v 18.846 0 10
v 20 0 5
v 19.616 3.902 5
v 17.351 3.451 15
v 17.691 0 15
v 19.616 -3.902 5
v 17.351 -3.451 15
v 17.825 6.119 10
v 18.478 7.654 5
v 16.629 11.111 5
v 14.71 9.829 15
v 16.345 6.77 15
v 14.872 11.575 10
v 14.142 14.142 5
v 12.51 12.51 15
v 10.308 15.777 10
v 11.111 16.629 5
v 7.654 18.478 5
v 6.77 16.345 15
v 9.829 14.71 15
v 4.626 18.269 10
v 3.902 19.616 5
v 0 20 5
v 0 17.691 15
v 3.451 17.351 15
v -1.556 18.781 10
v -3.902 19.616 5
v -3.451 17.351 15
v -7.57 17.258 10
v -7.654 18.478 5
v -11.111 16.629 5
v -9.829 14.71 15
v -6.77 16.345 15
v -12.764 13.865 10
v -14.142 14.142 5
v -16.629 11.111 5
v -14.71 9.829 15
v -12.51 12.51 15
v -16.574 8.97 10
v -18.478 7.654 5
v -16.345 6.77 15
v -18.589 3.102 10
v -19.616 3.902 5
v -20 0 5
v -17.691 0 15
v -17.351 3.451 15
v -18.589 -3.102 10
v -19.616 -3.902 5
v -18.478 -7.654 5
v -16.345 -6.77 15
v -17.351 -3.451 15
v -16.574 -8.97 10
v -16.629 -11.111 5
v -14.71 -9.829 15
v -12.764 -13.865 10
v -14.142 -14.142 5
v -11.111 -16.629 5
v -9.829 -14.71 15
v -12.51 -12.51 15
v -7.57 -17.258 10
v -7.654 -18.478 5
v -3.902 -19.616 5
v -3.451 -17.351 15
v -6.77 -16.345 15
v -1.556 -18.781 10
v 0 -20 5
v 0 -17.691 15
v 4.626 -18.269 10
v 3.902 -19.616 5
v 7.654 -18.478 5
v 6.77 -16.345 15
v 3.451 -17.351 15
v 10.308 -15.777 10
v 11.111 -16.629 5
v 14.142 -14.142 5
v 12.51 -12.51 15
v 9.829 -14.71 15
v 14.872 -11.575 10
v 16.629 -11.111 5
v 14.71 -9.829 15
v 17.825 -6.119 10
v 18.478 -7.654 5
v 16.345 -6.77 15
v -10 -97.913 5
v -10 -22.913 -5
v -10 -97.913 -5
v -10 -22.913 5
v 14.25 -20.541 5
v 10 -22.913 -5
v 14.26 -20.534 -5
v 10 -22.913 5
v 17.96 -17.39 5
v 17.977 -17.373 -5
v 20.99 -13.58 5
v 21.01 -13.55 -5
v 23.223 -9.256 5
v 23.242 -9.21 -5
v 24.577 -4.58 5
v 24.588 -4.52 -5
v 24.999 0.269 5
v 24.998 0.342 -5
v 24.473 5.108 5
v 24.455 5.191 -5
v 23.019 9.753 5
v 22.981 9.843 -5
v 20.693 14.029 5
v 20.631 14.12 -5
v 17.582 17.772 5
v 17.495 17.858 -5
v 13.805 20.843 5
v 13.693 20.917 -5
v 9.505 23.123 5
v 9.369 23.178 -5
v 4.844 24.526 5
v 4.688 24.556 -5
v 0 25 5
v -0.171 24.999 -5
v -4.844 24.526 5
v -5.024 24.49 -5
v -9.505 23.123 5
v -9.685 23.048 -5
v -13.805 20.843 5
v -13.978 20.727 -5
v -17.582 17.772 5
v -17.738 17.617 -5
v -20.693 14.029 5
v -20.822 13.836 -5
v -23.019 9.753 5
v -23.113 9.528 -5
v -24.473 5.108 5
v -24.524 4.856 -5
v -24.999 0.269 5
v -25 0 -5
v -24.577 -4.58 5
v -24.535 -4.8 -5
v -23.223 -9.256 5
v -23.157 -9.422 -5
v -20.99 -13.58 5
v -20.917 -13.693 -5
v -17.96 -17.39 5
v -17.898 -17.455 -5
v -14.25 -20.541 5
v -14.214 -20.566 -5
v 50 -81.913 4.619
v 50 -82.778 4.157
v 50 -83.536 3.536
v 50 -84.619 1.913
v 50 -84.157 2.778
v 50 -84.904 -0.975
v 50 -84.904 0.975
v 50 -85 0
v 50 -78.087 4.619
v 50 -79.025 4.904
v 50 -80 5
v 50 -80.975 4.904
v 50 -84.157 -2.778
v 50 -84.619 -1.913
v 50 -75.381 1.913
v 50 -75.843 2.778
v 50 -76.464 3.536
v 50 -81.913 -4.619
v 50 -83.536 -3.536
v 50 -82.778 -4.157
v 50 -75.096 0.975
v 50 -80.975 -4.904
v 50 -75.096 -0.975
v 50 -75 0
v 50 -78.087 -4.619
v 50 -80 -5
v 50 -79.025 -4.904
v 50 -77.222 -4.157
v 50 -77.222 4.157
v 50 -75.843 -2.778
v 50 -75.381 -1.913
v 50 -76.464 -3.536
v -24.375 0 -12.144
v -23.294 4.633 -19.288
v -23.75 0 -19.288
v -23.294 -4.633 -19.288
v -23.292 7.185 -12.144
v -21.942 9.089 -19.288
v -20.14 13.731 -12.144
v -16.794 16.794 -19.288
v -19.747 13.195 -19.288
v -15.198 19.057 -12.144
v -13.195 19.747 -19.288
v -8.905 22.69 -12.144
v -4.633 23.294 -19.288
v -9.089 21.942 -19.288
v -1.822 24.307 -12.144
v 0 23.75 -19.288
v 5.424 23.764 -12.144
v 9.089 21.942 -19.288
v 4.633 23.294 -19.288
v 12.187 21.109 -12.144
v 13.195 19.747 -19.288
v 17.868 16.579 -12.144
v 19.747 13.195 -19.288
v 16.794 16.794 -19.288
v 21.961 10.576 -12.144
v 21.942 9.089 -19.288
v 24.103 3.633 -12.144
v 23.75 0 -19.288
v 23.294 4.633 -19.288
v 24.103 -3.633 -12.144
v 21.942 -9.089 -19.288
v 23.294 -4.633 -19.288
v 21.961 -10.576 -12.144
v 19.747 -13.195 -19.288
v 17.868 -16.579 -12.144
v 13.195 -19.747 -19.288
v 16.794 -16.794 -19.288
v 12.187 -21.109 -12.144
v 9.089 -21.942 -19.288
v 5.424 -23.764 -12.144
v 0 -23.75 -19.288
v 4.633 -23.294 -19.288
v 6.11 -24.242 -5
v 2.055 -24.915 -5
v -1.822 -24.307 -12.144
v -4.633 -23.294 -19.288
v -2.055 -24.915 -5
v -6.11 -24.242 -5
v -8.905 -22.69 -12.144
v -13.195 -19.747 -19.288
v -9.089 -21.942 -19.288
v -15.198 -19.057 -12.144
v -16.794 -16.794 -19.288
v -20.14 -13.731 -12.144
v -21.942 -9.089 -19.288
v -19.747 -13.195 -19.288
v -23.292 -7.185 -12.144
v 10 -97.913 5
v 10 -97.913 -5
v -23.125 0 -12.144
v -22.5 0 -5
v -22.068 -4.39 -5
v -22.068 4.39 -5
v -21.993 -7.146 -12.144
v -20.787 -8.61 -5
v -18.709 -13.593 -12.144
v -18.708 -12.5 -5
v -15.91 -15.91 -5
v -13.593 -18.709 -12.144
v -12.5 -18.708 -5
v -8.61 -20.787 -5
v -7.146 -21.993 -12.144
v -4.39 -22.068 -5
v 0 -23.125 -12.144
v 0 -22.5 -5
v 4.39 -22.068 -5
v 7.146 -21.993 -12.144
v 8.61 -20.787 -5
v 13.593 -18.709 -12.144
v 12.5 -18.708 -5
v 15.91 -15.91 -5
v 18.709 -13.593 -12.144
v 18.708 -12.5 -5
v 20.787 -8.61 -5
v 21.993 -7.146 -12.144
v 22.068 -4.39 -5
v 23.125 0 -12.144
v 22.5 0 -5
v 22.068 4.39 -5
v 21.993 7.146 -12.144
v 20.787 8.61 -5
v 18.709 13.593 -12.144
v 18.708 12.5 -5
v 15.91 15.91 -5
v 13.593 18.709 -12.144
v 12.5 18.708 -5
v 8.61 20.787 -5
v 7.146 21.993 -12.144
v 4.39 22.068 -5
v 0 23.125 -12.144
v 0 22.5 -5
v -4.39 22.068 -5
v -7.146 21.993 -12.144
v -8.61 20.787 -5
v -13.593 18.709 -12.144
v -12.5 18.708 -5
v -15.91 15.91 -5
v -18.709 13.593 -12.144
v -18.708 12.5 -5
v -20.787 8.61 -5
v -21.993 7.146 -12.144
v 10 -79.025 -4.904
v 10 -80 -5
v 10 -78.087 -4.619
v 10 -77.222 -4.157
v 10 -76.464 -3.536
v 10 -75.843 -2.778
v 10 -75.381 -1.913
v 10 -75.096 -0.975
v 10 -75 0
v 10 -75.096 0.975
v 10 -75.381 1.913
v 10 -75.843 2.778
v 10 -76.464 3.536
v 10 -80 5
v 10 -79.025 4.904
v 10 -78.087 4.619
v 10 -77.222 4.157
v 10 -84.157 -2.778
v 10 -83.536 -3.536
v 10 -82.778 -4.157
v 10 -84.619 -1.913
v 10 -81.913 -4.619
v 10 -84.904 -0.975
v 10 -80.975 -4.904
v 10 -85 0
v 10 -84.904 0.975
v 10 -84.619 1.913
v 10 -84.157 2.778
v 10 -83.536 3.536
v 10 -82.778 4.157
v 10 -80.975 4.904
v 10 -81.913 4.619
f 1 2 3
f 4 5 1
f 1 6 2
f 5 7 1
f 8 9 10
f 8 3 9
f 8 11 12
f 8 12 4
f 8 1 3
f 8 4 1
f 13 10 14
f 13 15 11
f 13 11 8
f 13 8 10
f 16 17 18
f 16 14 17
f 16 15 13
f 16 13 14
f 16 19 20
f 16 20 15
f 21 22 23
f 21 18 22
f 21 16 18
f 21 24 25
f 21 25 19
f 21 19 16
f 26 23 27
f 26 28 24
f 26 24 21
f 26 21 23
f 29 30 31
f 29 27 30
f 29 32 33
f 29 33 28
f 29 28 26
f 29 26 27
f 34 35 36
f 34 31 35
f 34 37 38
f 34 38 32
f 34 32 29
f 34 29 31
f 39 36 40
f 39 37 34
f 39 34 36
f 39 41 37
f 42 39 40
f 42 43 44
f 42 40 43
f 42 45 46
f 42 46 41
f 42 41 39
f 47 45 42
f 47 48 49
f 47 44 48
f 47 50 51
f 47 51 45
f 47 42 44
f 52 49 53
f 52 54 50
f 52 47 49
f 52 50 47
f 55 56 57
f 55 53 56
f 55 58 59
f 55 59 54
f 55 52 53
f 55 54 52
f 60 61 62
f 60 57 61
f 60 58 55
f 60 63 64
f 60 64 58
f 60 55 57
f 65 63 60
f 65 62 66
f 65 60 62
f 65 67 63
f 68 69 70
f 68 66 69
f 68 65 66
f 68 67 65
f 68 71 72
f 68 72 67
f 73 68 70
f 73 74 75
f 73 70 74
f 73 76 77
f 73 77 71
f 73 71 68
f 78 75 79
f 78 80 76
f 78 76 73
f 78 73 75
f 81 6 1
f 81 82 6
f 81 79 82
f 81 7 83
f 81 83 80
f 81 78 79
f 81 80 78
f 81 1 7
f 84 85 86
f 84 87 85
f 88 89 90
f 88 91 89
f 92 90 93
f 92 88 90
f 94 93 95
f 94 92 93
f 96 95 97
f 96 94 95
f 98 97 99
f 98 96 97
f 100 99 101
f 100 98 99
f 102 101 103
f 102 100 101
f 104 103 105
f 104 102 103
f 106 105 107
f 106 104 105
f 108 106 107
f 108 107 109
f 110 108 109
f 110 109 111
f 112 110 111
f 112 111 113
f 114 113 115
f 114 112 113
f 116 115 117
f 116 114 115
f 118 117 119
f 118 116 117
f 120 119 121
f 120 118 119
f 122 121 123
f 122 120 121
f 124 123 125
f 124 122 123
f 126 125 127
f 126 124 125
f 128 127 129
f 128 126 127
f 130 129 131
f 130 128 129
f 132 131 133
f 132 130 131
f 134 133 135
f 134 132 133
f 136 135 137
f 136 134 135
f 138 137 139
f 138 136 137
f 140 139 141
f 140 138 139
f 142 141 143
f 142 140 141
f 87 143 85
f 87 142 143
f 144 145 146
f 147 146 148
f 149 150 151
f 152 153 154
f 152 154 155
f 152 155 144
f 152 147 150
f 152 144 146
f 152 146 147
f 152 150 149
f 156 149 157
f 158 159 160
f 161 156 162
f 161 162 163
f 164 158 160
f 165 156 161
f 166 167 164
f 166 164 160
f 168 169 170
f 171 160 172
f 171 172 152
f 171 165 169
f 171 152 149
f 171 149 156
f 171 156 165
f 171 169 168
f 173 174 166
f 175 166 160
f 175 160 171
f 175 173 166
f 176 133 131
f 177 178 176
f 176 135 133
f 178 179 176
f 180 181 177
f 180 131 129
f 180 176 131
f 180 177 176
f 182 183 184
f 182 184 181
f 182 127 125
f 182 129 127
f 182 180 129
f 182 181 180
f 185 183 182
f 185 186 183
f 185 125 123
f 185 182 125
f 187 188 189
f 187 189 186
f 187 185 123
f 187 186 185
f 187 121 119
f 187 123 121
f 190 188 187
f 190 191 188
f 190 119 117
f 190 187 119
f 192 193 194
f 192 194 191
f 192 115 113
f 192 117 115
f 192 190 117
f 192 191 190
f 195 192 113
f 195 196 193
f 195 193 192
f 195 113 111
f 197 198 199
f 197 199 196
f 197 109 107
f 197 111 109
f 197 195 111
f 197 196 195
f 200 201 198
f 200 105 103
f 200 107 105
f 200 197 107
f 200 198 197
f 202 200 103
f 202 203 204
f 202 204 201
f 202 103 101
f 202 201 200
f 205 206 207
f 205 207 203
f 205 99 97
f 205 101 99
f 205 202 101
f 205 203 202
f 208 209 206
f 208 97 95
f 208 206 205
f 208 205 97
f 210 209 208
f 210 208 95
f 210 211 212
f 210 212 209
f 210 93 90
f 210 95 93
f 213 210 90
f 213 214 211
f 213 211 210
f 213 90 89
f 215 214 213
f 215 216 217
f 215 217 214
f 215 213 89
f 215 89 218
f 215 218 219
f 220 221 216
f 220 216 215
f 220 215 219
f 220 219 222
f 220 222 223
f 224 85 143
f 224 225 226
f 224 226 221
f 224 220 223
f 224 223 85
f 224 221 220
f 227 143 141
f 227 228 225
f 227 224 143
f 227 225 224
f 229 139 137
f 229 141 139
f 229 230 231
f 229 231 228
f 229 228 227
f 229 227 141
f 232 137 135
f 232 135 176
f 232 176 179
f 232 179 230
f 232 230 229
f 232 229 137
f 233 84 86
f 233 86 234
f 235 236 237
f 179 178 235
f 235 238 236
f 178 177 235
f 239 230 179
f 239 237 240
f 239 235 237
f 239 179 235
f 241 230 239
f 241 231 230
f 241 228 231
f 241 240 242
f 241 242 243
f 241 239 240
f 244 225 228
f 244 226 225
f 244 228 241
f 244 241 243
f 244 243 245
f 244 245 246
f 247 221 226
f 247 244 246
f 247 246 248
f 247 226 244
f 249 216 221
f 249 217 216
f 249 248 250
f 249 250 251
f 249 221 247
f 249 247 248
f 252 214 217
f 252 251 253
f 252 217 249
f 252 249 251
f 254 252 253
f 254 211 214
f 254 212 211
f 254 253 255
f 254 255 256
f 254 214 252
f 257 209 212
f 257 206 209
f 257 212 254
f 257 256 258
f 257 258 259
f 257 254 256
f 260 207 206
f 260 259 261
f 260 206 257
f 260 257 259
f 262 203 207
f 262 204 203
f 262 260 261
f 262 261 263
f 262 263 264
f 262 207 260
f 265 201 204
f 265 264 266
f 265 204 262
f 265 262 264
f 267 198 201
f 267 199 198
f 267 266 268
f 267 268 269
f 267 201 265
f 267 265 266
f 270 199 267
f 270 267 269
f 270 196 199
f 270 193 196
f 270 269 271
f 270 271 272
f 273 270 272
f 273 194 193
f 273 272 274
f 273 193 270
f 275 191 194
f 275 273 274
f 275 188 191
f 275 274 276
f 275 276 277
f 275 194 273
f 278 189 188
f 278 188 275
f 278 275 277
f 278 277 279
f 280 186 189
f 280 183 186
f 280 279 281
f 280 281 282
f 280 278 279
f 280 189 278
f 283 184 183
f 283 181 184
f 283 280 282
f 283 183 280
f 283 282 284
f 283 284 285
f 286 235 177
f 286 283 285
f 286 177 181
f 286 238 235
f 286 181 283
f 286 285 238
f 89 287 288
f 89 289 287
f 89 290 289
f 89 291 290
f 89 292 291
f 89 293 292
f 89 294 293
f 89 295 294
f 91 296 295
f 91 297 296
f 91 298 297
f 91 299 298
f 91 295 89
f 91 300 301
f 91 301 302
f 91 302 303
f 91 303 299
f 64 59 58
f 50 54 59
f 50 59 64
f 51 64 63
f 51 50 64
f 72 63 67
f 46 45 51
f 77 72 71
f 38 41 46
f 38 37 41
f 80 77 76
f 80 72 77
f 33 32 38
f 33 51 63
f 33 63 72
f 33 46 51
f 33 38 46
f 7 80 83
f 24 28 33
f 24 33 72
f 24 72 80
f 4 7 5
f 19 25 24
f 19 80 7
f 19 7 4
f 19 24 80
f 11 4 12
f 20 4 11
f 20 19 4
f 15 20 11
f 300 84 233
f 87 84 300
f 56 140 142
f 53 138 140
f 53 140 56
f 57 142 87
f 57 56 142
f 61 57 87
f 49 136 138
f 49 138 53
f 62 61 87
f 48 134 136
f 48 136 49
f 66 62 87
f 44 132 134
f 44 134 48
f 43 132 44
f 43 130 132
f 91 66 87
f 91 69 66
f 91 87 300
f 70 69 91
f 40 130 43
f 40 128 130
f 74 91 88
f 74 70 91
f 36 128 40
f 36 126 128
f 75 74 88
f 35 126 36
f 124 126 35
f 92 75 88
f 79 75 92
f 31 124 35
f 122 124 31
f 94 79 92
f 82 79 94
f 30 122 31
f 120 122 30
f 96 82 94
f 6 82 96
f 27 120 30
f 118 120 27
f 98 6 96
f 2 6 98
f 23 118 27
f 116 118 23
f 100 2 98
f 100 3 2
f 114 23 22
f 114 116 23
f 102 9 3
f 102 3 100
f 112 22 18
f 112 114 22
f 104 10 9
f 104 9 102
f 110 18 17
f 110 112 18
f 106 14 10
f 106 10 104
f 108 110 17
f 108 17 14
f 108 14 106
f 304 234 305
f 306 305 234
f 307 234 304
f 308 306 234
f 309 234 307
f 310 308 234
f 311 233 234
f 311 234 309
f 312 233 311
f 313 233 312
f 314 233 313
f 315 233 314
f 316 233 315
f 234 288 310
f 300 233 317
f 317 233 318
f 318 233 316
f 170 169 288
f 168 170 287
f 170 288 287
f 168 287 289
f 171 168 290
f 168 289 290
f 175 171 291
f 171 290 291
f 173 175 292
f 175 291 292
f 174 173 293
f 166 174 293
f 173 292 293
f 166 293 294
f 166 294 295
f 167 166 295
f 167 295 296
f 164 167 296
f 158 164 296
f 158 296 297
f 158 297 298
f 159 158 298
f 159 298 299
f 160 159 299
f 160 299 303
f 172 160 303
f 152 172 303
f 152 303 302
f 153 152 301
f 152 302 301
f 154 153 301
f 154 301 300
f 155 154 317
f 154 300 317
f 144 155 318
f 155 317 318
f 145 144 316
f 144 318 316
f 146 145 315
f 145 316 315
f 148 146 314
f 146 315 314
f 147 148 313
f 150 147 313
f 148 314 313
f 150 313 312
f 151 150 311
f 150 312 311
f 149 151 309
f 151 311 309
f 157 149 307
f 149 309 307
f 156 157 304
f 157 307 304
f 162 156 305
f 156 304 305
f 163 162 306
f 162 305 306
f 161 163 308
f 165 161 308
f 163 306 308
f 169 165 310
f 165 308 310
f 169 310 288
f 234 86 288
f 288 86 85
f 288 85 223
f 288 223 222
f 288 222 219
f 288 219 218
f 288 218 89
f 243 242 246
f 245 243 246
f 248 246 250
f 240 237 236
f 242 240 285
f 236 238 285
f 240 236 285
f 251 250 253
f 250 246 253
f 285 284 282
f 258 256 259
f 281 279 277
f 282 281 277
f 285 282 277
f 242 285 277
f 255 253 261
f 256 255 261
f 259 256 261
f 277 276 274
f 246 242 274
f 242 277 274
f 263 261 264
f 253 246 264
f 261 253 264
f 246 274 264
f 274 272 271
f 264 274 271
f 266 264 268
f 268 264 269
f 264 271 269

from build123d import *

# Parameters (mm, degrees)
BOSS_EXTRUDE1_DEPTH = 5
SKETCH2_R           = 20
BOSS_EXTRUDE2_DEPTH = 10
BOSS_EXTRUDE2_TAPER = 13
SKETCH3_R           = 25
SKETCH3_R_2         = 22.5
BOSS_EXTRUDE3_DEPTH = 15
BOSS_EXTRUDE3_TAPER = 5
SKETCH4_R           = 5
BOSS_EXTRUDE4_DEPTH = 40


with BuildPart() as part:
    # Sketch1 → Boss-Extrude1 (new, symmetric)
    with BuildSketch(Plane.XY):
        with BuildLine():
            Line((-10, -22.912878475), (-10, -97.912878475))
            Line((-10, -97.912878475), (10, -97.912878475))
            Line((10, -97.912878475), (10, -22.912878475))
            ThreePointArc((10, -22.912878475), (0, 25), (-10, -22.912878475))
        make_face()
    extrude(amount=BOSS_EXTRUDE1_DEPTH, both=True)

    # Sketch2 → Boss-Extrude2 (add)
    with BuildSketch(Plane.XY.offset(5)):
        Circle(SKETCH2_R)
    extrude(amount=BOSS_EXTRUDE2_DEPTH, taper=BOSS_EXTRUDE2_TAPER)

    # Sketch3 → Boss-Extrude3 (add)
    with BuildSketch(Plane(origin=(0, 0, -5), x_dir=(-1, 0, 0), z_dir=(0, 0, -1))):
        Circle(SKETCH3_R)
        Circle(SKETCH3_R_2, mode=Mode.SUBTRACT)
    extrude(amount=BOSS_EXTRUDE3_DEPTH, taper=BOSS_EXTRUDE3_TAPER)

    # Sketch4 → Boss-Extrude4 (add)
    with BuildSketch(Plane(origin=(10, 0, 0), x_dir=(0, 0, -1), z_dir=(1, 0, 0))):
        with Locations((0, -80)):
            Circle(SKETCH4_R)
    extrude(amount=BOSS_EXTRUDE4_DEPTH)


solid = part.part
